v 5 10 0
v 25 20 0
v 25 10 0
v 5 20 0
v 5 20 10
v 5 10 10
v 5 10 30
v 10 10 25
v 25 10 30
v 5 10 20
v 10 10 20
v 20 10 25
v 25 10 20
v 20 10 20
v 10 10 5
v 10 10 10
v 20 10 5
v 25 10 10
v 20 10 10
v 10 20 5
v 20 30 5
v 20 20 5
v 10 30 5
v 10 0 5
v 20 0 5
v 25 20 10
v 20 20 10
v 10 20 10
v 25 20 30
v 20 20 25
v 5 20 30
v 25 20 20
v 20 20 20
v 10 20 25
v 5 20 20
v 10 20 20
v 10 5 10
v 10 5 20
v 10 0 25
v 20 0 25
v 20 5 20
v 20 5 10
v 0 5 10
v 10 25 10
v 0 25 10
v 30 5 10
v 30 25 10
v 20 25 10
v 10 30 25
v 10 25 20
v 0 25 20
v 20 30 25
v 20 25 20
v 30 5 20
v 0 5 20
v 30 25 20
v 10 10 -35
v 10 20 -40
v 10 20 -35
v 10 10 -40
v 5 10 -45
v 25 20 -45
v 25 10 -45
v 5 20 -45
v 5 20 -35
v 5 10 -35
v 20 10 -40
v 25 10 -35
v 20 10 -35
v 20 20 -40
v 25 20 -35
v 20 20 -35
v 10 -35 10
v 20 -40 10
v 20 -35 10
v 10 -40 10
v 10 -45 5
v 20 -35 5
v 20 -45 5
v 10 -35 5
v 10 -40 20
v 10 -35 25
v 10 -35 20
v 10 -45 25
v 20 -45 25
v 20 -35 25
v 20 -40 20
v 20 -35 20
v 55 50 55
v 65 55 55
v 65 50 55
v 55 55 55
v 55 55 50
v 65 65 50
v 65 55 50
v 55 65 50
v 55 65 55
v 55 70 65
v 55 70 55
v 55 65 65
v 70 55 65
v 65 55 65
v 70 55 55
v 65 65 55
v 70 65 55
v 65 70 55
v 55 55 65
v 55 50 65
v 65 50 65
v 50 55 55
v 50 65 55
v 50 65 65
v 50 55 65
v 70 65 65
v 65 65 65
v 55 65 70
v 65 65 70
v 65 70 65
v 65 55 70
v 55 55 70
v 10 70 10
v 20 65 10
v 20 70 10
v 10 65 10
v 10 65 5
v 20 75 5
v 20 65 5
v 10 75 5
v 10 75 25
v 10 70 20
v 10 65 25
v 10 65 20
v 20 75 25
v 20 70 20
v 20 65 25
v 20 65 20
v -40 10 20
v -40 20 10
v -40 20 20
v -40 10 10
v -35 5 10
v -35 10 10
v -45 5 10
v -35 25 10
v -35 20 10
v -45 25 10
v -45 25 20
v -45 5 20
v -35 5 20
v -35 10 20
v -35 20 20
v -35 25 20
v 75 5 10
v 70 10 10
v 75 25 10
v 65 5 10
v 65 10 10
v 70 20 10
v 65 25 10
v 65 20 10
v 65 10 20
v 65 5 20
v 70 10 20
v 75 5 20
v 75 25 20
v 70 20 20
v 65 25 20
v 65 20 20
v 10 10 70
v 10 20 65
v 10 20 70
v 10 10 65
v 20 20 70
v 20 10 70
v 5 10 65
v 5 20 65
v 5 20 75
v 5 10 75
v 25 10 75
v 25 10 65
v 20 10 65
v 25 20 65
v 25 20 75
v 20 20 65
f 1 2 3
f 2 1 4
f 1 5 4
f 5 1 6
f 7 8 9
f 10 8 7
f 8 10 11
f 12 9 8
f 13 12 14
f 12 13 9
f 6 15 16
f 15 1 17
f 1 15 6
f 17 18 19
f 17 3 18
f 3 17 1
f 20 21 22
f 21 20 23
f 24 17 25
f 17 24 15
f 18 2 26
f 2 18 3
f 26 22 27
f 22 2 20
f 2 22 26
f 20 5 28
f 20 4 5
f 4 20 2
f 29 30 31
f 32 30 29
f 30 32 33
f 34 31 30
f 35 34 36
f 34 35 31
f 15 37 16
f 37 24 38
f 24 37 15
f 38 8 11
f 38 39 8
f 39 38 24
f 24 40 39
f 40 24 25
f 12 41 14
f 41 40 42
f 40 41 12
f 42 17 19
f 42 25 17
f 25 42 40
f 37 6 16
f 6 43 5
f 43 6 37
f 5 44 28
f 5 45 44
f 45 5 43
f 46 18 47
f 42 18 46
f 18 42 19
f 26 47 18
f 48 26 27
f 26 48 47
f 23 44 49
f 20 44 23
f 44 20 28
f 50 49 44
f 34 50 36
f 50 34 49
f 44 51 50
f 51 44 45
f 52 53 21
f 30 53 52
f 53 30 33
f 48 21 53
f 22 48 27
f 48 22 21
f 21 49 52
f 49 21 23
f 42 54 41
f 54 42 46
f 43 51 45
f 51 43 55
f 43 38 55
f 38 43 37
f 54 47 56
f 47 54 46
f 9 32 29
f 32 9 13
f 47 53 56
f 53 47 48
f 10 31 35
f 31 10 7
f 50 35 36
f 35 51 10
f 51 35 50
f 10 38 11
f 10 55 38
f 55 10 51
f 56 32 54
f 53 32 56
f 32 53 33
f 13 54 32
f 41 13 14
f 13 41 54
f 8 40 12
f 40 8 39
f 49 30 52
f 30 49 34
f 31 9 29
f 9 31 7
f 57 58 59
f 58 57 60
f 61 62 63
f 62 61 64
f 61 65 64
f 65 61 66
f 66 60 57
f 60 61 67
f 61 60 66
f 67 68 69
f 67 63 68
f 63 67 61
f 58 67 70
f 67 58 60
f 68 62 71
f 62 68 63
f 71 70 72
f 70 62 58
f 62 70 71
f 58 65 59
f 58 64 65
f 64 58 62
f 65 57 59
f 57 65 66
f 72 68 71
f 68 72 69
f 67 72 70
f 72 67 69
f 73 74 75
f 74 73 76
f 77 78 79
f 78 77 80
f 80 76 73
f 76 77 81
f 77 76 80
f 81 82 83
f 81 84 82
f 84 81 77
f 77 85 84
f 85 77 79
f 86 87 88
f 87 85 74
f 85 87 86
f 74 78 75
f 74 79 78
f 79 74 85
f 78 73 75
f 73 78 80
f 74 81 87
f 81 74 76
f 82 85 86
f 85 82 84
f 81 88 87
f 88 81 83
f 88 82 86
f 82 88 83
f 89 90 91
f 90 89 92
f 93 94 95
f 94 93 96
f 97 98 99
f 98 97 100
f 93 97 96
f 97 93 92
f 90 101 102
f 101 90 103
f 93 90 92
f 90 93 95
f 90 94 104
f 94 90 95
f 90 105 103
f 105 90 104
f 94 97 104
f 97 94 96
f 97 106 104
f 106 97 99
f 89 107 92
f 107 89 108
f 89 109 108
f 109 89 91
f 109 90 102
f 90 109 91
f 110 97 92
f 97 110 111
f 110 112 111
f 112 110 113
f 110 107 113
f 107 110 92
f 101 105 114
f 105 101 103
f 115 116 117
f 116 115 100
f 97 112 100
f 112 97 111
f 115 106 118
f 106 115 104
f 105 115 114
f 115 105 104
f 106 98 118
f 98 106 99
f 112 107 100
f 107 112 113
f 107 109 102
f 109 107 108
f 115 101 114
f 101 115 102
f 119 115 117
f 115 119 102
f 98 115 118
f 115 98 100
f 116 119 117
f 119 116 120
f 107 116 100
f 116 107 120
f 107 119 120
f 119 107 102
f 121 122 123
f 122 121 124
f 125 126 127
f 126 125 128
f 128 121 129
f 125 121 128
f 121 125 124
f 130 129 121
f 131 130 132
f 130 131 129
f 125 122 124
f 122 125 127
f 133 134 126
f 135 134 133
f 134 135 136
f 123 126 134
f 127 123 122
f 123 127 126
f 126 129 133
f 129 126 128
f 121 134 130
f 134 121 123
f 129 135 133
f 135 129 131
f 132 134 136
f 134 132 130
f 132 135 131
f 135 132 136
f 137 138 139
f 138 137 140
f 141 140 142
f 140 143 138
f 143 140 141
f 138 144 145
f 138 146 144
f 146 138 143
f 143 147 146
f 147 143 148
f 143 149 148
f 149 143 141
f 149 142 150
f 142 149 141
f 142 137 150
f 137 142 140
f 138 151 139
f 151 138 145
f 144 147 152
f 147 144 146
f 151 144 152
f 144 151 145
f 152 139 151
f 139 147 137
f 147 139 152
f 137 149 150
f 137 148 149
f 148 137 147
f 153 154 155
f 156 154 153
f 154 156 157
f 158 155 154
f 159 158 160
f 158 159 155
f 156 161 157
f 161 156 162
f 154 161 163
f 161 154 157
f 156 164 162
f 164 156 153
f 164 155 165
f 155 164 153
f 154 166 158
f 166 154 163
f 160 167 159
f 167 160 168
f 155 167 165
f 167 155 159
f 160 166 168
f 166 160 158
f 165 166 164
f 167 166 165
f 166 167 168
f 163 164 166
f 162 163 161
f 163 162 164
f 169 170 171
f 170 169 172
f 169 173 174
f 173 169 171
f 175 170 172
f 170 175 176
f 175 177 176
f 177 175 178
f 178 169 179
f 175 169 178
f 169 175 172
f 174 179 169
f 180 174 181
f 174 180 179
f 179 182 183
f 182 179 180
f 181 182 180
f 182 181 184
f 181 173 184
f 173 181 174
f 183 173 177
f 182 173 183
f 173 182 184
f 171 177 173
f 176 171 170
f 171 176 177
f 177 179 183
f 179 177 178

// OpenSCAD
// SCAD file for Six Piece Burr Puzzle
// 整体模型
union() {
  translate([5, 10, 0]) color([1, 0.8, 0, 0.85]) cube([5, 5, 5]);
  translate([10, 10, 0]) color([1, 0.8, 0, 0.85]) cube([5, 5, 5]);
  translate([15, 10, 0]) color([1, 0.8, 0, 0.85]) cube([5, 5, 5]);
  translate([20, 10, 0]) color([1, 0.8, 0, 0.85]) cube([5, 5, 5]);
  translate([5, 15, 0]) color([1, 0.8, 0, 0.85]) cube([5, 5, 5]);
  translate([10, 15, 0]) color([1, 0.8, 0, 0.85]) cube([5, 5, 5]);
  translate([15, 15, 0]) color([1, 0.8, 0, 0.85]) cube([5, 5, 5]);
  translate([20, 15, 0]) color([1, 0.8, 0, 0.85]) cube([5, 5, 5]);
  translate([10, 0, 5]) color([0, 0.8, 0, 0.85]) cube([5, 5, 5]);
  translate([15, 0, 5]) color([0, 0.8, 0, 0.85]) cube([5, 5, 5]);
  translate([10, 5, 5]) color([0, 0.8, 0, 0.85]) cube([5, 5, 5]);
  translate([15, 5, 5]) color([0, 0.8, 0, 0.85]) cube([5, 5, 5]);
  translate([5, 10, 5]) color([1, 0.8, 0, 0.85]) cube([5, 5, 5]);
  translate([10, 10, 5]) color([0.8, 0.8, 0.8, 0.85]) cube([5, 5, 5]);
  translate([15, 10, 5]) color([0.8, 0.8, 0.8, 0.85]) cube([5, 5, 5]);
  translate([20, 10, 5]) color([1, 0.8, 0, 0.85]) cube([5, 5, 5]);
  translate([5, 15, 5]) color([1, 0.8, 0, 0.85]) cube([5, 5, 5]);
  translate([10, 15, 5]) color([0.8, 0.8, 0.8, 0.85]) cube([5, 5, 5]);
  translate([15, 15, 5]) color([0.8, 0.8, 0.8, 0.85]) cube([5, 5, 5]);
  translate([20, 15, 5]) color([1, 0.8, 0, 0.85]) cube([5, 5, 5]);
  translate([10, 20, 5]) color([1, 0, 0, 0.85]) cube([5, 5, 5]);
  translate([15, 20, 5]) color([1, 0, 0, 0.85]) cube([5, 5, 5]);
  translate([10, 25, 5]) color([1, 0, 0, 0.85]) cube([5, 5, 5]);
  translate([15, 25, 5]) color([1, 0, 0, 0.85]) cube([5, 5, 5]);
  translate([10, 0, 10]) color([0, 0.8, 0, 0.85]) cube([5, 5, 5]);
  translate([15, 0, 10]) color([0, 0.8, 0, 0.85]) cube([5, 5, 5]);
  translate([0, 5, 10]) color([0.6, 0, 1, 0.85]) cube([5, 5, 5]);
  translate([5, 5, 10]) color([0.6, 0, 1, 0.85]) cube([5, 5, 5]);
  translate([10, 5, 10]) color([0.8, 0.8, 0.8, 0.85]) cube([5, 5, 5]);
  translate([15, 5, 10]) color([0.8, 0.8, 0.8, 0.85]) cube([5, 5, 5]);
  translate([20, 5, 10]) color([1, 0.4, 0, 0.85]) cube([5, 5, 5]);
  translate([25, 5, 10]) color([1, 0.4, 0, 0.85]) cube([5, 5, 5]);
  translate([0, 10, 10]) color([0.6, 0, 1, 0.85]) cube([5, 5, 5]);
  translate([5, 10, 10]) color([0.8, 0.8, 0.8, 0.85]) cube([5, 5, 5]);
  translate([10, 10, 10]) color([0.8, 0.8, 0.8, 0.85]) cube([5, 5, 5]);
  translate([15, 10, 10]) color([0.8, 0.8, 0.8, 0.85]) cube([5, 5, 5]);
  translate([20, 10, 10]) color([0.8, 0.8, 0.8, 0.85]) cube([5, 5, 5]);
  translate([25, 10, 10]) color([1, 0.4, 0, 0.85]) cube([5, 5, 5]);
  translate([0, 15, 10]) color([0.6, 0, 1, 0.85]) cube([5, 5, 5]);
  translate([5, 15, 10]) color([0.8, 0.8, 0.8, 0.85]) cube([5, 5, 5]);
  translate([10, 15, 10]) color([0.8, 0.8, 0.8, 0.85]) cube([5, 5, 5]);
  translate([15, 15, 10]) color([0.8, 0.8, 0.8, 0.85]) cube([5, 5, 5]);
  translate([20, 15, 10]) color([0.8, 0.8, 0.8, 0.85]) cube([5, 5, 5]);
  translate([25, 15, 10]) color([1, 0.4, 0, 0.85]) cube([5, 5, 5]);
  translate([0, 20, 10]) color([0.6, 0, 1, 0.85]) cube([5, 5, 5]);
  translate([5, 20, 10]) color([0.6, 0, 1, 0.85]) cube([5, 5, 5]);
  translate([10, 20, 10]) color([0.8, 0.8, 0.8, 0.85]) cube([5, 5, 5]);
  translate([15, 20, 10]) color([0.8, 0.8, 0.8, 0.85]) cube([5, 5, 5]);
  translate([20, 20, 10]) color([1, 0.4, 0, 0.85]) cube([5, 5, 5]);
  translate([25, 20, 10]) color([1, 0.4, 0, 0.85]) cube([5, 5, 5]);
  translate([10, 25, 10]) color([1, 0, 0, 0.85]) cube([5, 5, 5]);
  translate([15, 25, 10]) color([1, 0, 0, 0.85]) cube([5, 5, 5]);
  translate([10, 0, 15]) color([0, 0.8, 0, 0.85]) cube([5, 5, 5]);
  translate([15, 0, 15]) color([0, 0.8, 0, 0.85]) cube([5, 5, 5]);
  translate([0, 5, 15]) color([0.6, 0, 1, 0.85]) cube([5, 5, 5]);
  translate([5, 5, 15]) color([0.6, 0, 1, 0.85]) cube([5, 5, 5]);
  translate([10, 5, 15]) color([0.8, 0.8, 0.8, 0.85]) cube([5, 5, 5]);
  translate([15, 5, 15]) color([0.8, 0.8, 0.8, 0.85]) cube([5, 5, 5]);
  translate([20, 5, 15]) color([1, 0.4, 0, 0.85]) cube([5, 5, 5]);
  translate([25, 5, 15]) color([1, 0.4, 0, 0.85]) cube([5, 5, 5]);
  translate([0, 10, 15]) color([0.6, 0, 1, 0.85]) cube([5, 5, 5]);
  translate([5, 10, 15]) color([0.8, 0.8, 0.8, 0.85]) cube([5, 5, 5]);
  translate([10, 10, 15]) color([0.8, 0.8, 0.8, 0.85]) cube([5, 5, 5]);
  translate([15, 10, 15]) color([0.8, 0.8, 0.8, 0.85]) cube([5, 5, 5]);
  translate([20, 10, 15]) color([0.8, 0.8, 0.8, 0.85]) cube([5, 5, 5]);
  translate([25, 10, 15]) color([1, 0.4, 0, 0.85]) cube([5, 5, 5]);
  translate([0, 15, 15]) color([0.6, 0, 1, 0.85]) cube([5, 5, 5]);
  translate([5, 15, 15]) color([0.8, 0.8, 0.8, 0.85]) cube([5, 5, 5]);
  translate([10, 15, 15]) color([0.8, 0.8, 0.8, 0.85]) cube([5, 5, 5]);
  translate([15, 15, 15]) color([0.8, 0.8, 0.8, 0.85]) cube([5, 5, 5]);
  translate([20, 15, 15]) color([0.8, 0.8, 0.8, 0.85]) cube([5, 5, 5]);
  translate([25, 15, 15]) color([1, 0.4, 0, 0.85]) cube([5, 5, 5]);
  translate([0, 20, 15]) color([0.6, 0, 1, 0.85]) cube([5, 5, 5]);
  translate([5, 20, 15]) color([0.6, 0, 1, 0.85]) cube([5, 5, 5]);
  translate([10, 20, 15]) color([0.8, 0.8, 0.8, 0.85]) cube([5, 5, 5]);
  translate([15, 20, 15]) color([0.8, 0.8, 0.8, 0.85]) cube([5, 5, 5]);
  translate([20, 20, 15]) color([1, 0.4, 0, 0.85]) cube([5, 5, 5]);
  translate([25, 20, 15]) color([1, 0.4, 0, 0.85]) cube([5, 5, 5]);
  translate([10, 25, 15]) color([1, 0, 0, 0.85]) cube([5, 5, 5]);
  translate([15, 25, 15]) color([1, 0, 0, 0.85]) cube([5, 5, 5]);
  translate([10, 0, 20]) color([0, 0.8, 0, 0.85]) cube([5, 5, 5]);
  translate([15, 0, 20]) color([0, 0.8, 0, 0.85]) cube([5, 5, 5]);
  translate([10, 5, 20]) color([0, 0.8, 0, 0.85]) cube([5, 5, 5]);
  translate([15, 5, 20]) color([0, 0.8, 0, 0.85]) cube([5, 5, 5]);
  translate([5, 10, 20]) color([0, 0.4, 1, 0.85]) cube([5, 5, 5]);
  translate([10, 10, 20]) color([0.8, 0.8, 0.8, 0.85]) cube([5, 5, 5]);
  translate([15, 10, 20]) color([0.8, 0.8, 0.8, 0.85]) cube([5, 5, 5]);
  translate([20, 10, 20]) color([0, 0.4, 1, 0.85]) cube([5, 5, 5]);
  translate([5, 15, 20]) color([0, 0.4, 1, 0.85]) cube([5, 5, 5]);
  translate([10, 15, 20]) color([0.8, 0.8, 0.8, 0.85]) cube([5, 5, 5]);
  translate([15, 15, 20]) color([0.8, 0.8, 0.8, 0.85]) cube([5, 5, 5]);
  translate([20, 15, 20]) color([0, 0.4, 1, 0.85]) cube([5, 5, 5]);
  translate([10, 20, 20]) color([1, 0, 0, 0.85]) cube([5, 5, 5]);
  translate([15, 20, 20]) color([1, 0, 0, 0.85]) cube([5, 5, 5]);
  translate([10, 25, 20]) color([1, 0, 0, 0.85]) cube([5, 5, 5]);
  translate([15, 25, 20]) color([1, 0, 0, 0.85]) cube([5, 5, 5]);
  translate([5, 10, 25]) color([0, 0.4, 1, 0.85]) cube([5, 5, 5]);
  translate([10, 10, 25]) color([0, 0.4, 1, 0.85]) cube([5, 5, 5]);
  translate([15, 10, 25]) color([0, 0.4, 1, 0.85]) cube([5, 5, 5]);
  translate([20, 10, 25]) color([0, 0.4, 1, 0.85]) cube([5, 5, 5]);
  translate([5, 15, 25]) color([0, 0.4, 1, 0.85]) cube([5, 5, 5]);
  translate([10, 15, 25]) color([0, 0.4, 1, 0.85]) cube([5, 5, 5]);
  translate([15, 15, 25]) color([0, 0.4, 1, 0.85]) cube([5, 5, 5]);
  translate([20, 15, 25]) color([0, 0.4, 1, 0.85]) cube([5, 5, 5]);
}

// 零件 D
union() {
  translate([5.0, 10.0, -45.0]) color([1, 0.8, 0, 0.85]) cube([5, 5, 5]);
  translate([10.0, 10.0, -45.0]) color([1, 0.8, 0, 0.85]) cube([5, 5, 5]);
  translate([15.0, 10.0, -45.0]) color([1, 0.8, 0, 0.85]) cube([5, 5, 5]);
  translate([20.0, 10.0, -45.0]) color([1, 0.8, 0, 0.85]) cube([5, 5, 5]);
  translate([5.0, 15.0, -45.0]) color([1, 0.8, 0, 0.85]) cube([5, 5, 5]);
  translate([10.0, 15.0, -45.0]) color([1, 0.8, 0, 0.85]) cube([5, 5, 5]);
  translate([15.0, 15.0, -45.0]) color([1, 0.8, 0, 0.85]) cube([5, 5, 5]);
  translate([20.0, 15.0, -45.0]) color([1, 0.8, 0, 0.85]) cube([5, 5, 5]);
  translate([5.0, 10.0, -40.0]) color([1, 0.8, 0, 0.85]) cube([5, 5, 5]);
  translate([20.0, 10.0, -40.0]) color([1, 0.8, 0, 0.85]) cube([5, 5, 5]);
  translate([5.0, 15.0, -40.0]) color([1, 0.8, 0, 0.85]) cube([5, 5, 5]);
  translate([20.0, 15.0, -40.0]) color([1, 0.8, 0, 0.85]) cube([5, 5, 5]);
}

// 零件 B
union() {
  translate([10.0, -45.0, 5.0]) color([0, 0.8, 0, 0.85]) cube([5, 5, 5]);
  translate([15.0, -45.0, 5.0]) color([0, 0.8, 0, 0.85]) cube([5, 5, 5]);
  translate([10.0, -40.0, 5.0]) color([0, 0.8, 0, 0.85]) cube([5, 5, 5]);
  translate([15.0, -40.0, 5.0]) color([0, 0.8, 0, 0.85]) cube([5, 5, 5]);
  translate([10.0, -45.0, 10.0]) color([0, 0.8, 0, 0.85]) cube([5, 5, 5]);
  translate([15.0, -45.0, 10.0]) color([0, 0.8, 0, 0.85]) cube([5, 5, 5]);
  translate([10.0, -45.0, 15.0]) color([0, 0.8, 0, 0.85]) cube([5, 5, 5]);
  translate([15.0, -45.0, 15.0]) color([0, 0.8, 0, 0.85]) cube([5, 5, 5]);
  translate([10.0, -45.0, 20.0]) color([0, 0.8, 0, 0.85]) cube([5, 5, 5]);
  translate([15.0, -45.0, 20.0]) color([0, 0.8, 0, 0.85]) cube([5, 5, 5]);
  translate([10.0, -40.0, 20.0]) color([0, 0.8, 0, 0.85]) cube([5, 5, 5]);
  translate([15.0, -40.0, 20.0]) color([0, 0.8, 0, 0.85]) cube([5, 5, 5]);
}

// 零件 public
union() {
  translate([55.0, 55.0, 50.0]) color([0.8, 0.8, 0.8, 0.85]) cube([5, 5, 5]);
  translate([60.0, 55.0, 50.0]) color([0.8, 0.8, 0.8, 0.85]) cube([5, 5, 5]);
  translate([55.0, 60.0, 50.0]) color([0.8, 0.8, 0.8, 0.85]) cube([5, 5, 5]);
  translate([60.0, 60.0, 50.0]) color([0.8, 0.8, 0.8, 0.85]) cube([5, 5, 5]);
  translate([55.0, 50.0, 55.0]) color([0.8, 0.8, 0.8, 0.85]) cube([5, 5, 5]);
  translate([60.0, 50.0, 55.0]) color([0.8, 0.8, 0.8, 0.85]) cube([5, 5, 5]);
  translate([50.0, 55.0, 55.0]) color([0.8, 0.8, 0.8, 0.85]) cube([5, 5, 5]);
  translate([55.0, 55.0, 55.0]) color([0.8, 0.8, 0.8, 0.85]) cube([5, 5, 5]);
  translate([60.0, 55.0, 55.0]) color([0.8, 0.8, 0.8, 0.85]) cube([5, 5, 5]);
  translate([65.0, 55.0, 55.0]) color([0.8, 0.8, 0.8, 0.85]) cube([5, 5, 5]);
  translate([50.0, 60.0, 55.0]) color([0.8, 0.8, 0.8, 0.85]) cube([5, 5, 5]);
  translate([55.0, 60.0, 55.0]) color([0.8, 0.8, 0.8, 0.85]) cube([5, 5, 5]);
  translate([60.0, 60.0, 55.0]) color([0.8, 0.8, 0.8, 0.85]) cube([5, 5, 5]);
  translate([65.0, 60.0, 55.0]) color([0.8, 0.8, 0.8, 0.85]) cube([5, 5, 5]);
  translate([55.0, 65.0, 55.0]) color([0.8, 0.8, 0.8, 0.85]) cube([5, 5, 5]);
  translate([60.0, 65.0, 55.0]) color([0.8, 0.8, 0.8, 0.85]) cube([5, 5, 5]);
  translate([55.0, 50.0, 60.0]) color([0.8, 0.8, 0.8, 0.85]) cube([5, 5, 5]);
  translate([60.0, 50.0, 60.0]) color([0.8, 0.8, 0.8, 0.85]) cube([5, 5, 5]);
  translate([50.0, 55.0, 60.0]) color([0.8, 0.8, 0.8, 0.85]) cube([5, 5, 5]);
  translate([55.0, 55.0, 60.0]) color([0.8, 0.8, 0.8, 0.85]) cube([5, 5, 5]);
  translate([60.0, 55.0, 60.0]) color([0.8, 0.8, 0.8, 0.85]) cube([5, 5, 5]);
  translate([65.0, 55.0, 60.0]) color([0.8, 0.8, 0.8, 0.85]) cube([5, 5, 5]);
  translate([50.0, 60.0, 60.0]) color([0.8, 0.8, 0.8, 0.85]) cube([5, 5, 5]);
  translate([55.0, 60.0, 60.0]) color([0.8, 0.8, 0.8, 0.85]) cube([5, 5, 5]);
  translate([60.0, 60.0, 60.0]) color([0.8, 0.8, 0.8, 0.85]) cube([5, 5, 5]);
  translate([65.0, 60.0, 60.0]) color([0.8, 0.8, 0.8, 0.85]) cube([5, 5, 5]);
  translate([55.0, 65.0, 60.0]) color([0.8, 0.8, 0.8, 0.85]) cube([5, 5, 5]);
  translate([60.0, 65.0, 60.0]) color([0.8, 0.8, 0.8, 0.85]) cube([5, 5, 5]);
  translate([55.0, 55.0, 65.0]) color([0.8, 0.8, 0.8, 0.85]) cube([5, 5, 5]);
  translate([60.0, 55.0, 65.0]) color([0.8, 0.8, 0.8, 0.85]) cube([5, 5, 5]);
  translate([55.0, 60.0, 65.0]) color([0.8, 0.8, 0.8, 0.85]) cube([5, 5, 5]);
  translate([60.0, 60.0, 65.0]) color([0.8, 0.8, 0.8, 0.85]) cube([5, 5, 5]);
}

// 零件 A
union() {
  translate([10.0, 65.0, 5.0]) color([1, 0, 0, 0.85]) cube([5, 5, 5]);
  translate([15.0, 65.0, 5.0]) color([1, 0, 0, 0.85]) cube([5, 5, 5]);
  translate([10.0, 70.0, 5.0]) color([1, 0, 0, 0.85]) cube([5, 5, 5]);
  translate([15.0, 70.0, 5.0]) color([1, 0, 0, 0.85]) cube([5, 5, 5]);
  translate([10.0, 70.0, 10.0]) color([1, 0, 0, 0.85]) cube([5, 5, 5]);
  translate([15.0, 70.0, 10.0]) color([1, 0, 0, 0.85]) cube([5, 5, 5]);
  translate([10.0, 70.0, 15.0]) color([1, 0, 0, 0.85]) cube([5, 5, 5]);
  translate([15.0, 70.0, 15.0]) color([1, 0, 0, 0.85]) cube([5, 5, 5]);
  translate([10.0, 65.0, 20.0]) color([1, 0, 0, 0.85]) cube([5, 5, 5]);
  translate([15.0, 65.0, 20.0]) color([1, 0, 0, 0.85]) cube([5, 5, 5]);
  translate([10.0, 70.0, 20.0]) color([1, 0, 0, 0.85]) cube([5, 5, 5]);
  translate([15.0, 70.0, 20.0]) color([1, 0, 0, 0.85]) cube([5, 5, 5]);
}

// 零件 F
union() {
  translate([-45.0, 5.0, 10.0]) color([0.6, 0, 1, 0.85]) cube([5, 5, 5]);
  translate([-40.0, 5.0, 10.0]) color([0.6, 0, 1, 0.85]) cube([5, 5, 5]);
  translate([-45.0, 10.0, 10.0]) color([0.6, 0, 1, 0.85]) cube([5, 5, 5]);
  translate([-45.0, 15.0, 10.0]) color([0.6, 0, 1, 0.85]) cube([5, 5, 5]);
  translate([-45.0, 20.0, 10.0]) color([0.6, 0, 1, 0.85]) cube([5, 5, 5]);
  translate([-40.0, 20.0, 10.0]) color([0.6, 0, 1, 0.85]) cube([5, 5, 5]);
  translate([-45.0, 5.0, 15.0]) color([0.6, 0, 1, 0.85]) cube([5, 5, 5]);
  translate([-40.0, 5.0, 15.0]) color([0.6, 0, 1, 0.85]) cube([5, 5, 5]);
  translate([-45.0, 10.0, 15.0]) color([0.6, 0, 1, 0.85]) cube([5, 5, 5]);
  translate([-45.0, 15.0, 15.0]) color([0.6, 0, 1, 0.85]) cube([5, 5, 5]);
  translate([-45.0, 20.0, 15.0]) color([0.6, 0, 1, 0.85]) cube([5, 5, 5]);
  translate([-40.0, 20.0, 15.0]) color([0.6, 0, 1, 0.85]) cube([5, 5, 5]);
}

// 零件 E
union() {
  translate([65.0, 5.0, 10.0]) color([1, 0.4, 0, 0.85]) cube([5, 5, 5]);
  translate([70.0, 5.0, 10.0]) color([1, 0.4, 0, 0.85]) cube([5, 5, 5]);
  translate([70.0, 10.0, 10.0]) color([1, 0.4, 0, 0.85]) cube([5, 5, 5]);
  translate([70.0, 15.0, 10.0]) color([1, 0.4, 0, 0.85]) cube([5, 5, 5]);
  translate([65.0, 20.0, 10.0]) color([1, 0.4, 0, 0.85]) cube([5, 5, 5]);
  translate([70.0, 20.0, 10.0]) color([1, 0.4, 0, 0.85]) cube([5, 5, 5]);
  translate([65.0, 5.0, 15.0]) color([1, 0.4, 0, 0.85]) cube([5, 5, 5]);
  translate([70.0, 5.0, 15.0]) color([1, 0.4, 0, 0.85]) cube([5, 5, 5]);
  translate([70.0, 10.0, 15.0]) color([1, 0.4, 0, 0.85]) cube([5, 5, 5]);
  translate([70.0, 15.0, 15.0]) color([1, 0.4, 0, 0.85]) cube([5, 5, 5]);
  translate([65.0, 20.0, 15.0]) color([1, 0.4, 0, 0.85]) cube([5, 5, 5]);
  translate([70.0, 20.0, 15.0]) color([1, 0.4, 0, 0.85]) cube([5, 5, 5]);
}

// 零件 C
union() {
  translate([5.0, 10.0, 65.0]) color([0, 0.4, 1, 0.85]) cube([5, 5, 5]);
  translate([20.0, 10.0, 65.0]) color([0, 0.4, 1, 0.85]) cube([5, 5, 5]);
  translate([5.0, 15.0, 65.0]) color([0, 0.4, 1, 0.85]) cube([5, 5, 5]);
  translate([20.0, 15.0, 65.0]) color([0, 0.4, 1, 0.85]) cube([5, 5, 5]);
  translate([5.0, 10.0, 70.0]) color([0, 0.4, 1, 0.85]) cube([5, 5, 5]);
  translate([10.0, 10.0, 70.0]) color([0, 0.4, 1, 0.85]) cube([5, 5, 5]);
  translate([15.0, 10.0, 70.0]) color([0, 0.4, 1, 0.85]) cube([5, 5, 5]);
  translate([20.0, 10.0, 70.0]) color([0, 0.4, 1, 0.85]) cube([5, 5, 5]);
  translate([5.0, 15.0, 70.0]) color([0, 0.4, 1, 0.85]) cube([5, 5, 5]);
  translate([10.0, 15.0, 70.0]) color([0, 0.4, 1, 0.85]) cube([5, 5, 5]);
  translate([15.0, 15.0, 70.0]) color([0, 0.4, 1, 0.85]) cube([5, 5, 5]);
  translate([20.0, 15.0, 70.0]) color([0, 0.4, 1, 0.85]) cube([5, 5, 5]);
}
